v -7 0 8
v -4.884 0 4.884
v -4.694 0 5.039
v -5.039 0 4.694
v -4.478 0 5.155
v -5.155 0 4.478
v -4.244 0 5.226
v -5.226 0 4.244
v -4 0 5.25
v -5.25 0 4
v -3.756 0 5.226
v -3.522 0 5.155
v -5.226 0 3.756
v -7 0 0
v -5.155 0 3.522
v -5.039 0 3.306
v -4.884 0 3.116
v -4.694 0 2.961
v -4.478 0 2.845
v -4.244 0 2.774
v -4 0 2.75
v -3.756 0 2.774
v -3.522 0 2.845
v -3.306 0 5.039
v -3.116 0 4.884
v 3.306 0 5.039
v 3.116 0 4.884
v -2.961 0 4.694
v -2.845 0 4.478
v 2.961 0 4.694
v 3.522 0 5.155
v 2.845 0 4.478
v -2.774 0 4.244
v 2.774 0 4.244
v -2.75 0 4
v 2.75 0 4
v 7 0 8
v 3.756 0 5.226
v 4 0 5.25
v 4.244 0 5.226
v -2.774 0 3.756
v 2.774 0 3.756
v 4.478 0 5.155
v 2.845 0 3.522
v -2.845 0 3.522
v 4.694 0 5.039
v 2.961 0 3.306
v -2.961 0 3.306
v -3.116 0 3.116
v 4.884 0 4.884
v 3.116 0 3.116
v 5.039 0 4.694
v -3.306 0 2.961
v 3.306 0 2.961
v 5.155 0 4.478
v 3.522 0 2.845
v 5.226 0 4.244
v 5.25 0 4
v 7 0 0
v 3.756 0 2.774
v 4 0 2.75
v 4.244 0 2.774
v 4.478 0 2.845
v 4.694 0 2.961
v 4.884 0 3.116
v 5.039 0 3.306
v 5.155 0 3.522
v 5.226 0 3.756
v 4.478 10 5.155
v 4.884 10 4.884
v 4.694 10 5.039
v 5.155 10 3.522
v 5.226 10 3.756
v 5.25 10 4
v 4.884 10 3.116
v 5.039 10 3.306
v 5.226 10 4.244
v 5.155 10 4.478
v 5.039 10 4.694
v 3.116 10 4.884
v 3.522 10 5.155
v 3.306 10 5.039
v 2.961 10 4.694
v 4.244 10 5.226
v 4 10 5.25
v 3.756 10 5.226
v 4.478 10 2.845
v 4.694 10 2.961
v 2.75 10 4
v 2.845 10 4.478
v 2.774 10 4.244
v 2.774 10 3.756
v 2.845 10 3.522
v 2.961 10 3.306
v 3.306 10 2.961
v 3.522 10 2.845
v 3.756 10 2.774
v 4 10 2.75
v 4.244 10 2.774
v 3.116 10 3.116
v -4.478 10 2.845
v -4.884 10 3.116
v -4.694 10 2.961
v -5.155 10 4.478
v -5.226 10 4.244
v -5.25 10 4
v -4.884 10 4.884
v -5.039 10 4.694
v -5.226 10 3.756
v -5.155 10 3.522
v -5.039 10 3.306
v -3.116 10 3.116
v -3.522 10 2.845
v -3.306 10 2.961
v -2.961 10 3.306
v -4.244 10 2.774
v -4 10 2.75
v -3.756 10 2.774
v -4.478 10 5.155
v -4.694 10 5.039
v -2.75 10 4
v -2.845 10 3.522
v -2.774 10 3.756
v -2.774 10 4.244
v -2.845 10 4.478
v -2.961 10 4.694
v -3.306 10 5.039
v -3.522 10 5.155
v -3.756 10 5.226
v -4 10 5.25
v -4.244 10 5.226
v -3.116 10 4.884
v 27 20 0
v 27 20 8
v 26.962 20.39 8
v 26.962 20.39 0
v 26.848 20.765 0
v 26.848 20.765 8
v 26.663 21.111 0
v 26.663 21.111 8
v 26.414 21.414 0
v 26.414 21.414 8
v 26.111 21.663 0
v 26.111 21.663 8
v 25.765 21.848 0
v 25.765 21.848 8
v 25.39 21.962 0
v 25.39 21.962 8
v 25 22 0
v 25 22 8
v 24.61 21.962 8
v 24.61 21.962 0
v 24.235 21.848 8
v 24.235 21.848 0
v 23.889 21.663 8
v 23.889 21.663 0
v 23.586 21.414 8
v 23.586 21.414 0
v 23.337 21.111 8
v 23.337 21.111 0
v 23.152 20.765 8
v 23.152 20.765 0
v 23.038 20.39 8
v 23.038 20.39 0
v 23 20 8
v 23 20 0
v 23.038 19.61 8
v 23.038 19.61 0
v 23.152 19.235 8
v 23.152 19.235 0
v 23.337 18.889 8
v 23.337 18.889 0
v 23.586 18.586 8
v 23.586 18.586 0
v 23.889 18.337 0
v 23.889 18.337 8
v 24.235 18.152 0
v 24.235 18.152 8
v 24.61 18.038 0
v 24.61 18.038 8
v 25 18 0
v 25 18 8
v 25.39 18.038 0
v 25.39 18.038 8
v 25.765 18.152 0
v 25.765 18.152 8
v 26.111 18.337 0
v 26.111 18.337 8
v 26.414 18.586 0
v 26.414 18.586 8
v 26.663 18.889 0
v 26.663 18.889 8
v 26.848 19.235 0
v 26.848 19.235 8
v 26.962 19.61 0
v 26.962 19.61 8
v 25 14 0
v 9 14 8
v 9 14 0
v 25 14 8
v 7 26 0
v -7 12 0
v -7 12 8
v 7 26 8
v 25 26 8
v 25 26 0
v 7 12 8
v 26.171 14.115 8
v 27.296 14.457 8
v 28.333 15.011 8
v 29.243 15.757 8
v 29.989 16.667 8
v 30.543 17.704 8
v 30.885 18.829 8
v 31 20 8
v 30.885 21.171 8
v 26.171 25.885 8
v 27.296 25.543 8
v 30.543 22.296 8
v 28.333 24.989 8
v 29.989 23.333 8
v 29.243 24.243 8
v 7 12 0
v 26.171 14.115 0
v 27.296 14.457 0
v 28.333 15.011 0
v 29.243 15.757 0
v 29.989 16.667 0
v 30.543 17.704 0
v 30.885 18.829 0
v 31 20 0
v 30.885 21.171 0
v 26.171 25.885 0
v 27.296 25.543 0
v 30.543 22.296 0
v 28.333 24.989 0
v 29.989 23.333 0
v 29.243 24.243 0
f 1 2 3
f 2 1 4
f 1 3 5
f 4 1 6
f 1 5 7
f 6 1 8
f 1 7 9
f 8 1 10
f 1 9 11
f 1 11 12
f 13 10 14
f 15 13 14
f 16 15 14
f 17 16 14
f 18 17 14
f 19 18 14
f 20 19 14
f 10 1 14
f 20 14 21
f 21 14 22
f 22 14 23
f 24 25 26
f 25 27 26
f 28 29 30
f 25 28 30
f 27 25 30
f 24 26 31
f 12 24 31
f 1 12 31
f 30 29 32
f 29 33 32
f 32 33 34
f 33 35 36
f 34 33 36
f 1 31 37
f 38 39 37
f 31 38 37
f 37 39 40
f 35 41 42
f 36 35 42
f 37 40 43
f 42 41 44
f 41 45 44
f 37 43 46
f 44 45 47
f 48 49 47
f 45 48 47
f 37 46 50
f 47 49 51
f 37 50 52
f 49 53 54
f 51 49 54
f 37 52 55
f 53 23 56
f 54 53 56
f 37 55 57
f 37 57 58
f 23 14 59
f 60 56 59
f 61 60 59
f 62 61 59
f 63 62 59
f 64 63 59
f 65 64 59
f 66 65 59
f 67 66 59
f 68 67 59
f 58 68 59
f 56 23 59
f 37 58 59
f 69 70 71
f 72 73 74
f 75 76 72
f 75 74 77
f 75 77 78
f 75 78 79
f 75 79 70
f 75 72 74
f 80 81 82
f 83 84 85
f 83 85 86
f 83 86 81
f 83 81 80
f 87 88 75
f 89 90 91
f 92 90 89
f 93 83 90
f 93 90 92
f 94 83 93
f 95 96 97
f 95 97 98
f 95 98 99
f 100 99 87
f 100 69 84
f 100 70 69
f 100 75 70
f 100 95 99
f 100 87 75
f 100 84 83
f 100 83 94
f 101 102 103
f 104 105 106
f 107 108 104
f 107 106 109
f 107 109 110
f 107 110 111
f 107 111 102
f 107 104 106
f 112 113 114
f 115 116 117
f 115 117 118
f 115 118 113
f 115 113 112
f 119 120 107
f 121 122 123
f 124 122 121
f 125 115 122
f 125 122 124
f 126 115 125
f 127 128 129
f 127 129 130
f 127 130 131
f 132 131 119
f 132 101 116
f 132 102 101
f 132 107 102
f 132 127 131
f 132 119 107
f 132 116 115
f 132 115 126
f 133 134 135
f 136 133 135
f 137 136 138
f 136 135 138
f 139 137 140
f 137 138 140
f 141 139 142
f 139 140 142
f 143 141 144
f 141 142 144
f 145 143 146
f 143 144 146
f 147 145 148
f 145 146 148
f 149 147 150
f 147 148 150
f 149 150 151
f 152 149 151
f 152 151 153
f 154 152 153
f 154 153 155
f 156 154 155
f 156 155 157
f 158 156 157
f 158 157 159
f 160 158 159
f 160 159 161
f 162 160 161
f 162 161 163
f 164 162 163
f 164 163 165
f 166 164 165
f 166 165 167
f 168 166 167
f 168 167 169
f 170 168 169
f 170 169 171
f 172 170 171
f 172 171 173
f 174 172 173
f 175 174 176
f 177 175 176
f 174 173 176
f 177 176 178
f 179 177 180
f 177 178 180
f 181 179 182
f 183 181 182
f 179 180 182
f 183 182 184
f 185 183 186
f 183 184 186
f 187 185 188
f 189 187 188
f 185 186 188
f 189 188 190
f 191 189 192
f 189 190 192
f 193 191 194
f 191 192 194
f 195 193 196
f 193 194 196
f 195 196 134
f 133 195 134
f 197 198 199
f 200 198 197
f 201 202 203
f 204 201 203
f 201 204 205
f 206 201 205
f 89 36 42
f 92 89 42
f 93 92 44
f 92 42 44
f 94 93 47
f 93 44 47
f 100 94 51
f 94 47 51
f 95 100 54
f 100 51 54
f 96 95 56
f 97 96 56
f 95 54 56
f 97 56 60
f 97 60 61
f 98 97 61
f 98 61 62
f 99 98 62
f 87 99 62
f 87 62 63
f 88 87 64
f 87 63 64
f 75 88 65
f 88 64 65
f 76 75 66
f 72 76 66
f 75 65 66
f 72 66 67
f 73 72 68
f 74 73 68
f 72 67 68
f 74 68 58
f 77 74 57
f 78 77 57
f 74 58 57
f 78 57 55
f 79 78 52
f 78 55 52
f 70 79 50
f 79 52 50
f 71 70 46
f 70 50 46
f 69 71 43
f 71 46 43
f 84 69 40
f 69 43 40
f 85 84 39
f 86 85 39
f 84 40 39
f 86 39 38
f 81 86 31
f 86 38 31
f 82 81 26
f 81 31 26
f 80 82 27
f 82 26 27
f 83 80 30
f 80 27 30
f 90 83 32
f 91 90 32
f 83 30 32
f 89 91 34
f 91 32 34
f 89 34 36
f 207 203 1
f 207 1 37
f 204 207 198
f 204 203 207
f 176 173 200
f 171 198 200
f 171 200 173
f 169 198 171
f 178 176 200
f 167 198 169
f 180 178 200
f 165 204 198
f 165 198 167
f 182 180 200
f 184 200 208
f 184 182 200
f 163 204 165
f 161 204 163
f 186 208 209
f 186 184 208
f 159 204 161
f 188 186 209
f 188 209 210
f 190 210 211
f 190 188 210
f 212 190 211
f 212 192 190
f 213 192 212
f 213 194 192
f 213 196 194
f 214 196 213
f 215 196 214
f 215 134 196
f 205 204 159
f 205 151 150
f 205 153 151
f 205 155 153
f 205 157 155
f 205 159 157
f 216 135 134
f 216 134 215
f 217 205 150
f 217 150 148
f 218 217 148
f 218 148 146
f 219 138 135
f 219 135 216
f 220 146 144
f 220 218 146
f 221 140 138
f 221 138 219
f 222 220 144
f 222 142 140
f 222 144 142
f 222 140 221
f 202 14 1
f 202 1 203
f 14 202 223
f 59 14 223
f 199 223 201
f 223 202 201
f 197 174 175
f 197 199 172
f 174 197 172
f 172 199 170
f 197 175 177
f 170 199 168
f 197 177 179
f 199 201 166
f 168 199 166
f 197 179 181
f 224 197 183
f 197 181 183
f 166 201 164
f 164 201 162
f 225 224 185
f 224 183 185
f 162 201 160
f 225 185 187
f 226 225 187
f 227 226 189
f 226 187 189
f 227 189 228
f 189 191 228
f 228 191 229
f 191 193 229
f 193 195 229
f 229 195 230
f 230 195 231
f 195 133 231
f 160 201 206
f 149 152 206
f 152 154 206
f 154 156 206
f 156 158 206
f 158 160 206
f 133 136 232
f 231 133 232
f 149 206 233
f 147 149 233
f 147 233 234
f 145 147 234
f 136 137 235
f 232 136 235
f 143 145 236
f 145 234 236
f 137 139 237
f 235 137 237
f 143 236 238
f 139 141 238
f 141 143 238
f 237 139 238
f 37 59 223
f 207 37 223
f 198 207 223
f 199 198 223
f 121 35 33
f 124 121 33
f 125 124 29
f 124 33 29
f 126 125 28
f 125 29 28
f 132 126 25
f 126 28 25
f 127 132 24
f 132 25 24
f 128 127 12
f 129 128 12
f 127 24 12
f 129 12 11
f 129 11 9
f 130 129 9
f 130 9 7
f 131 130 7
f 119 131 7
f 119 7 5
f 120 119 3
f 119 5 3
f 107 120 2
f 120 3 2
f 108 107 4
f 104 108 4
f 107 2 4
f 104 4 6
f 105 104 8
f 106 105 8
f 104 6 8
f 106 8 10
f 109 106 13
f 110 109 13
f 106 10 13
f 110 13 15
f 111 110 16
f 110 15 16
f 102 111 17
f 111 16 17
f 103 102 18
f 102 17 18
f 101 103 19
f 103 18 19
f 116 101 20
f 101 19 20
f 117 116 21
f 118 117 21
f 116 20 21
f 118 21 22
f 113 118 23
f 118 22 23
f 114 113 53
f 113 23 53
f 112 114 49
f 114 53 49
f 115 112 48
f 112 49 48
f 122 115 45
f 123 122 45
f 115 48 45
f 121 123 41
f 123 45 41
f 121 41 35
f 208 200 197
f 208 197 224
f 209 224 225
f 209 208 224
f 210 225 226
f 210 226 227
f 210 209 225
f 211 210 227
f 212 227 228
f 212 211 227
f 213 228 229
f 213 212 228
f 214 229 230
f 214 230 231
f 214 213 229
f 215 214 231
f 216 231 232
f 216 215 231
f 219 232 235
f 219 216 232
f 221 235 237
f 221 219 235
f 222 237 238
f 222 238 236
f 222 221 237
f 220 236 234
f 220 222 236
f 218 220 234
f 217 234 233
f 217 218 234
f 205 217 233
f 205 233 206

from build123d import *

# Parameters (mm, degrees)
ESQUISSE1_W             = 14
ESQUISSE1_H             = 26
BOSS_EXTRU_1_DEPTH      = 8
ESQUISSE3_R             = 1.25
ENL_V_MAT_EXTRU_1_DEPTH = 10
ESQUISSE4_W             = 24
ESQUISSE4_H             = 12
BOSS_EXTRU_2_DEPTH      = 8
ESQUISSE5_R             = 2
ENL_V_MAT_EXTRU_2_DEPTH = 42.243181255
CHANFREIN1_SIZE         = 14
ENL_V_MAT_EXTRU_3_DEPTH = 42.243181255
CHANFREIN2_SIZE         = 2


with BuildPart() as part:
    # Esquisse1 → Boss.-Extru.1 (new body)
    with BuildSketch(Plane.XY):
        with Locations((0, 13)):
            Rectangle(ESQUISSE1_W, ESQUISSE1_H)
    extrude(amount=BOSS_EXTRU_1_DEPTH)

    # Esquisse3 → Enlèv. mat.-Extru.1 (cut)
    with BuildSketch(Plane(origin=(0, 0, 0), x_dir=(-1, 0, 0), z_dir=(0, -1, 0))):
        with Locations(Location((4, -4, 0), (0, 0, 180))):
            Circle(ESQUISSE3_R)
        with Locations((-4, -4)):
            Circle(ESQUISSE3_R)
    extrude(amount=-ENL_V_MAT_EXTRU_1_DEPTH, mode=Mode.SUBTRACT)

    # Esquisse4 → Boss.-Extru.2 (add)
    with BuildSketch(Plane.XY.offset(8)):
        with Locations((19, 20)):
            Rectangle(ESQUISSE4_W, ESQUISSE4_H)
    extrude(amount=-BOSS_EXTRU_2_DEPTH)

    # Esquisse5 → Enlèv. mat.-Extru.2 (cut, through all)
    with BuildSketch(Plane.XY.offset(8)):
        with Locations((25, 20)):
            Circle(ESQUISSE5_R)
    extrude(amount=-ENL_V_MAT_EXTRU_2_DEPTH, mode=Mode.SUBTRACT)

    # Chanfrein1
    chanfrein1_edges = [part.edges().sort_by_distance(p)[0] for p in [
        (-7, 26, 4),
    ]]
    chamfer(chanfrein1_edges, length=CHANFREIN1_SIZE)

    # Esquisse6 → Enlèv. mat.-Extru.3 (cut, through all)
    with BuildSketch(Plane.XY.offset(8)):
        with BuildLine():
            Line((25, 26), (32, 26))
            Line((32, 26), (32, 14))
            Line((32, 14), (25, 14))
            ThreePointArc((25, 14), (31, 20), (25, 26))
        make_face()
    extrude(amount=-ENL_V_MAT_EXTRU_3_DEPTH, mode=Mode.SUBTRACT)

    # Chanfrein2
    chanfrein2_edges = [part.edges().sort_by_distance(p)[0] for p in [
        (7, 14, 4),
    ]]
    chamfer(chanfrein2_edges, length=CHANFREIN2_SIZE)


solid = part.part
